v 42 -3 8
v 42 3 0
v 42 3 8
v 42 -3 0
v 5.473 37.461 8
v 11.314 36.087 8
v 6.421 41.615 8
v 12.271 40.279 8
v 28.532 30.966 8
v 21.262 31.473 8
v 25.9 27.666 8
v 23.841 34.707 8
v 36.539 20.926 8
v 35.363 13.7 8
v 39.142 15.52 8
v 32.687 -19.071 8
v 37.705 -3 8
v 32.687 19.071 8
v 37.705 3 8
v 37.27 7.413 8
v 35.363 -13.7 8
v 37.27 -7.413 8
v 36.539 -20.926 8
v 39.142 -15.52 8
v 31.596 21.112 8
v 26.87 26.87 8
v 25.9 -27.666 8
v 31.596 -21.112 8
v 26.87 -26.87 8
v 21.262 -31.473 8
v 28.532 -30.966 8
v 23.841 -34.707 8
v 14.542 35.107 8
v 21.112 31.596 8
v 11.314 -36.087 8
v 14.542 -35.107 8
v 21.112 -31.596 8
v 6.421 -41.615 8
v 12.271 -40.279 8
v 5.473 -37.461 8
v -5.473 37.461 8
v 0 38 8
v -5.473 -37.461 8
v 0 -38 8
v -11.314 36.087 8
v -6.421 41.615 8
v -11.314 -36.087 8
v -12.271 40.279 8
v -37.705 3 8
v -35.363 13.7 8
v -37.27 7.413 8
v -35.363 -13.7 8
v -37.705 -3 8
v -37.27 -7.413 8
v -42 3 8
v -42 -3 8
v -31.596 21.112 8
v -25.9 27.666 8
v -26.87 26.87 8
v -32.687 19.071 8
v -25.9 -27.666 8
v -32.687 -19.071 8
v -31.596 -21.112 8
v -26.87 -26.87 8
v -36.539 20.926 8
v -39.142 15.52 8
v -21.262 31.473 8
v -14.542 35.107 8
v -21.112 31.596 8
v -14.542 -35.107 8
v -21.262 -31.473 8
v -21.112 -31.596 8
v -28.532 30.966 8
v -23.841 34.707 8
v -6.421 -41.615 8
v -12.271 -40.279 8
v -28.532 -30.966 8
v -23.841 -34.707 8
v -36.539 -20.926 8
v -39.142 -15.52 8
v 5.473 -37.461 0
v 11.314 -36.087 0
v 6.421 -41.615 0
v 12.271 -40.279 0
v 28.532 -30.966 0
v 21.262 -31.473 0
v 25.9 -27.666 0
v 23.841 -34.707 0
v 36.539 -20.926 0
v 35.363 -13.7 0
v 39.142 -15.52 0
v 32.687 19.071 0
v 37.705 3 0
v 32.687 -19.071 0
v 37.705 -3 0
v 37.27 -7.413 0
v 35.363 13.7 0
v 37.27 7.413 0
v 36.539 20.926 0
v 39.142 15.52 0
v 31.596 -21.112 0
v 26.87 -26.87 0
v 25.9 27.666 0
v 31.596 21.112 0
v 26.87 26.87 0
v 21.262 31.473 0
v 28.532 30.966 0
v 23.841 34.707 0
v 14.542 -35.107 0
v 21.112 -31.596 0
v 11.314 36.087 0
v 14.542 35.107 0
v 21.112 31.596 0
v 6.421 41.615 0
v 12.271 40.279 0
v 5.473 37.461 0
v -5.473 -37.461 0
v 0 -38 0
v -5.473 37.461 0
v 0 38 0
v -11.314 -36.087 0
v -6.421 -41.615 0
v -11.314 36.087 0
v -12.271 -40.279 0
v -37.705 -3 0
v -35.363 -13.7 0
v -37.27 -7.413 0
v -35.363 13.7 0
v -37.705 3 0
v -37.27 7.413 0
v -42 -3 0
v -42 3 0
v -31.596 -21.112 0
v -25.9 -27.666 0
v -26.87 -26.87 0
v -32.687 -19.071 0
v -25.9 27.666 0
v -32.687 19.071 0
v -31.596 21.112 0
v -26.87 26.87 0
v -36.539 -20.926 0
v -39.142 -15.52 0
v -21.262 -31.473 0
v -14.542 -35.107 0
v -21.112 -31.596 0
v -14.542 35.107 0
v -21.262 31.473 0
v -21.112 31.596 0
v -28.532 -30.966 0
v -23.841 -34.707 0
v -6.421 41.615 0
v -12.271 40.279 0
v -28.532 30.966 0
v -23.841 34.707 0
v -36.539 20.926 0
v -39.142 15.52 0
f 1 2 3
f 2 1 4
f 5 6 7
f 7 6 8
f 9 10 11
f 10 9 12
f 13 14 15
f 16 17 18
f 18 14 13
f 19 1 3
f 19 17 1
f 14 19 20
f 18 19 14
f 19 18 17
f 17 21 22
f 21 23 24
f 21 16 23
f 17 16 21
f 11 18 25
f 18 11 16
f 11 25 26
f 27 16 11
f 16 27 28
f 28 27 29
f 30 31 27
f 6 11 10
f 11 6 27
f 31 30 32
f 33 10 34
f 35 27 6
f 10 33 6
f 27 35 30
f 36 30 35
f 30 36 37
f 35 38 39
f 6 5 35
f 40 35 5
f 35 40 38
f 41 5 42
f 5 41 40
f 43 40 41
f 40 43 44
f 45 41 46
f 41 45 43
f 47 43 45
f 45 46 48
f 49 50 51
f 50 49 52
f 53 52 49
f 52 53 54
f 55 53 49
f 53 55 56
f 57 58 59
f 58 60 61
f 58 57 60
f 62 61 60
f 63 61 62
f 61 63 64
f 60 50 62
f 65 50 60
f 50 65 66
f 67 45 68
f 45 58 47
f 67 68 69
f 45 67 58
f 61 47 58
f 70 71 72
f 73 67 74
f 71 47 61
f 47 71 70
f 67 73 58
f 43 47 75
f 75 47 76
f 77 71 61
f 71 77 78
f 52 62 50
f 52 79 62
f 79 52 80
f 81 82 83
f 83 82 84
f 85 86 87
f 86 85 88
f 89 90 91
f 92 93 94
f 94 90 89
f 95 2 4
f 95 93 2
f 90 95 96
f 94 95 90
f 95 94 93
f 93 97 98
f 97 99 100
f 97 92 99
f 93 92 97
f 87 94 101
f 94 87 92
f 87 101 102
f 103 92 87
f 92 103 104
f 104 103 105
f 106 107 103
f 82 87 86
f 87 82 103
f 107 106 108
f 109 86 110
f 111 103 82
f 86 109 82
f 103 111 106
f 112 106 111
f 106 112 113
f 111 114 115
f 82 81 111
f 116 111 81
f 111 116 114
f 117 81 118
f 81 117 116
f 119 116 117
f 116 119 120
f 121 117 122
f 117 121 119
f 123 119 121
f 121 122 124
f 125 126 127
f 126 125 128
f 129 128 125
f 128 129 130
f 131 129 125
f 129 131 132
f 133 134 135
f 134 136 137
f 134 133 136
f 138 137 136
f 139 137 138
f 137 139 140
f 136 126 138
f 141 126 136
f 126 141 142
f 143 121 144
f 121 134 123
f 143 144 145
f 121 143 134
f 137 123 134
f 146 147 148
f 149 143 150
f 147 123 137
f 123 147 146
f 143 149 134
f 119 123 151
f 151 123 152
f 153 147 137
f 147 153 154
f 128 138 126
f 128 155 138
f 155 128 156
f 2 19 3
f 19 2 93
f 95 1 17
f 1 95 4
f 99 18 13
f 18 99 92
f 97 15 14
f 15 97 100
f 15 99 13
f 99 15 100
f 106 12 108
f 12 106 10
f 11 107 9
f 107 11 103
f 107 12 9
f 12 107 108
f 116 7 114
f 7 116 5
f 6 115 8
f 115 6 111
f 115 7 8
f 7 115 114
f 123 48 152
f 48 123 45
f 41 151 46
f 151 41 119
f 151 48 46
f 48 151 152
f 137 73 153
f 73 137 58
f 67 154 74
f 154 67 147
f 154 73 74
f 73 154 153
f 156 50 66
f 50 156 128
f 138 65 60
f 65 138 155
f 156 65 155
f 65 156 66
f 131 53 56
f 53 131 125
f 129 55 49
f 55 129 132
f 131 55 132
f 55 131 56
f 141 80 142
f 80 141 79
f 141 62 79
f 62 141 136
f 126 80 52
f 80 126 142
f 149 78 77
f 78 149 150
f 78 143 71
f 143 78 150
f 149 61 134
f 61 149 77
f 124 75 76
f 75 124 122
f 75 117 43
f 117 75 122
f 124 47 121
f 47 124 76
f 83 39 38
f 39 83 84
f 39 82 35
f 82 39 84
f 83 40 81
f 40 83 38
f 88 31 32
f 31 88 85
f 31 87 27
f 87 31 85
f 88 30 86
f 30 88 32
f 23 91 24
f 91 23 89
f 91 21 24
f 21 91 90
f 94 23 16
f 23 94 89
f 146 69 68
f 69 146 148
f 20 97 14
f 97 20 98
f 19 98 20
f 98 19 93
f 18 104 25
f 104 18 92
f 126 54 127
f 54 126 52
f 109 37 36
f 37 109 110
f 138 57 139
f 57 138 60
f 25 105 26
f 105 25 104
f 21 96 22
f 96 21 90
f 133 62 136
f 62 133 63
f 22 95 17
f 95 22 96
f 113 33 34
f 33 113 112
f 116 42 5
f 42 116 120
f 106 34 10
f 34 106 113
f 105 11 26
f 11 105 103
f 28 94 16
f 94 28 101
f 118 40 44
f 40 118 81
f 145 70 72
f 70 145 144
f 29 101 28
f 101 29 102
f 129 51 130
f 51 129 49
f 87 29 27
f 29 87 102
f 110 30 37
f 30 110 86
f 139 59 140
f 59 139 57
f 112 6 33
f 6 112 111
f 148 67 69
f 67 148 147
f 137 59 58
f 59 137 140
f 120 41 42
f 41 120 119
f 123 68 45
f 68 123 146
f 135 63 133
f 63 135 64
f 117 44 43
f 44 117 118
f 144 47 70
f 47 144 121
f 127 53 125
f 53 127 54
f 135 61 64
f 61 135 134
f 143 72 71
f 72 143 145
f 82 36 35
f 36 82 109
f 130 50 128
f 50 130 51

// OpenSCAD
$fn = 32;

// ----------------------------------------------------------------------
// Spur blank: plain gear blank
// ----------------------------------------------------------------------

// --- parameters (mm) ---
disc_r = 38;              // blank root radius
disc_t = 8;               // blank thickness
n_teeth = 14;             // stub tooth count
tooth_w = 6;              // tooth width at the root
tooth_h = 4;              // tooth height above the root
fit_tol = 0.05;           // tolerance for press fits, mm
free_tol = 0.3;           // tolerance for clearance fits, mm

out_r = disc_r + tooth_h;  // tip radius
bbox_x = 84.0;  // measured width over the teeth
bbox_y = 83.23;  // measured depth over the teeth

union() {
  cylinder(r = disc_r, h = disc_t);
  for (i = [0 : n_teeth - 1])
    rotate([0, 0, i * 360 / n_teeth])
      translate([disc_r - 1, -tooth_w / 2, 0])
        cube([tooth_h + 1, tooth_w, disc_t]);
}
